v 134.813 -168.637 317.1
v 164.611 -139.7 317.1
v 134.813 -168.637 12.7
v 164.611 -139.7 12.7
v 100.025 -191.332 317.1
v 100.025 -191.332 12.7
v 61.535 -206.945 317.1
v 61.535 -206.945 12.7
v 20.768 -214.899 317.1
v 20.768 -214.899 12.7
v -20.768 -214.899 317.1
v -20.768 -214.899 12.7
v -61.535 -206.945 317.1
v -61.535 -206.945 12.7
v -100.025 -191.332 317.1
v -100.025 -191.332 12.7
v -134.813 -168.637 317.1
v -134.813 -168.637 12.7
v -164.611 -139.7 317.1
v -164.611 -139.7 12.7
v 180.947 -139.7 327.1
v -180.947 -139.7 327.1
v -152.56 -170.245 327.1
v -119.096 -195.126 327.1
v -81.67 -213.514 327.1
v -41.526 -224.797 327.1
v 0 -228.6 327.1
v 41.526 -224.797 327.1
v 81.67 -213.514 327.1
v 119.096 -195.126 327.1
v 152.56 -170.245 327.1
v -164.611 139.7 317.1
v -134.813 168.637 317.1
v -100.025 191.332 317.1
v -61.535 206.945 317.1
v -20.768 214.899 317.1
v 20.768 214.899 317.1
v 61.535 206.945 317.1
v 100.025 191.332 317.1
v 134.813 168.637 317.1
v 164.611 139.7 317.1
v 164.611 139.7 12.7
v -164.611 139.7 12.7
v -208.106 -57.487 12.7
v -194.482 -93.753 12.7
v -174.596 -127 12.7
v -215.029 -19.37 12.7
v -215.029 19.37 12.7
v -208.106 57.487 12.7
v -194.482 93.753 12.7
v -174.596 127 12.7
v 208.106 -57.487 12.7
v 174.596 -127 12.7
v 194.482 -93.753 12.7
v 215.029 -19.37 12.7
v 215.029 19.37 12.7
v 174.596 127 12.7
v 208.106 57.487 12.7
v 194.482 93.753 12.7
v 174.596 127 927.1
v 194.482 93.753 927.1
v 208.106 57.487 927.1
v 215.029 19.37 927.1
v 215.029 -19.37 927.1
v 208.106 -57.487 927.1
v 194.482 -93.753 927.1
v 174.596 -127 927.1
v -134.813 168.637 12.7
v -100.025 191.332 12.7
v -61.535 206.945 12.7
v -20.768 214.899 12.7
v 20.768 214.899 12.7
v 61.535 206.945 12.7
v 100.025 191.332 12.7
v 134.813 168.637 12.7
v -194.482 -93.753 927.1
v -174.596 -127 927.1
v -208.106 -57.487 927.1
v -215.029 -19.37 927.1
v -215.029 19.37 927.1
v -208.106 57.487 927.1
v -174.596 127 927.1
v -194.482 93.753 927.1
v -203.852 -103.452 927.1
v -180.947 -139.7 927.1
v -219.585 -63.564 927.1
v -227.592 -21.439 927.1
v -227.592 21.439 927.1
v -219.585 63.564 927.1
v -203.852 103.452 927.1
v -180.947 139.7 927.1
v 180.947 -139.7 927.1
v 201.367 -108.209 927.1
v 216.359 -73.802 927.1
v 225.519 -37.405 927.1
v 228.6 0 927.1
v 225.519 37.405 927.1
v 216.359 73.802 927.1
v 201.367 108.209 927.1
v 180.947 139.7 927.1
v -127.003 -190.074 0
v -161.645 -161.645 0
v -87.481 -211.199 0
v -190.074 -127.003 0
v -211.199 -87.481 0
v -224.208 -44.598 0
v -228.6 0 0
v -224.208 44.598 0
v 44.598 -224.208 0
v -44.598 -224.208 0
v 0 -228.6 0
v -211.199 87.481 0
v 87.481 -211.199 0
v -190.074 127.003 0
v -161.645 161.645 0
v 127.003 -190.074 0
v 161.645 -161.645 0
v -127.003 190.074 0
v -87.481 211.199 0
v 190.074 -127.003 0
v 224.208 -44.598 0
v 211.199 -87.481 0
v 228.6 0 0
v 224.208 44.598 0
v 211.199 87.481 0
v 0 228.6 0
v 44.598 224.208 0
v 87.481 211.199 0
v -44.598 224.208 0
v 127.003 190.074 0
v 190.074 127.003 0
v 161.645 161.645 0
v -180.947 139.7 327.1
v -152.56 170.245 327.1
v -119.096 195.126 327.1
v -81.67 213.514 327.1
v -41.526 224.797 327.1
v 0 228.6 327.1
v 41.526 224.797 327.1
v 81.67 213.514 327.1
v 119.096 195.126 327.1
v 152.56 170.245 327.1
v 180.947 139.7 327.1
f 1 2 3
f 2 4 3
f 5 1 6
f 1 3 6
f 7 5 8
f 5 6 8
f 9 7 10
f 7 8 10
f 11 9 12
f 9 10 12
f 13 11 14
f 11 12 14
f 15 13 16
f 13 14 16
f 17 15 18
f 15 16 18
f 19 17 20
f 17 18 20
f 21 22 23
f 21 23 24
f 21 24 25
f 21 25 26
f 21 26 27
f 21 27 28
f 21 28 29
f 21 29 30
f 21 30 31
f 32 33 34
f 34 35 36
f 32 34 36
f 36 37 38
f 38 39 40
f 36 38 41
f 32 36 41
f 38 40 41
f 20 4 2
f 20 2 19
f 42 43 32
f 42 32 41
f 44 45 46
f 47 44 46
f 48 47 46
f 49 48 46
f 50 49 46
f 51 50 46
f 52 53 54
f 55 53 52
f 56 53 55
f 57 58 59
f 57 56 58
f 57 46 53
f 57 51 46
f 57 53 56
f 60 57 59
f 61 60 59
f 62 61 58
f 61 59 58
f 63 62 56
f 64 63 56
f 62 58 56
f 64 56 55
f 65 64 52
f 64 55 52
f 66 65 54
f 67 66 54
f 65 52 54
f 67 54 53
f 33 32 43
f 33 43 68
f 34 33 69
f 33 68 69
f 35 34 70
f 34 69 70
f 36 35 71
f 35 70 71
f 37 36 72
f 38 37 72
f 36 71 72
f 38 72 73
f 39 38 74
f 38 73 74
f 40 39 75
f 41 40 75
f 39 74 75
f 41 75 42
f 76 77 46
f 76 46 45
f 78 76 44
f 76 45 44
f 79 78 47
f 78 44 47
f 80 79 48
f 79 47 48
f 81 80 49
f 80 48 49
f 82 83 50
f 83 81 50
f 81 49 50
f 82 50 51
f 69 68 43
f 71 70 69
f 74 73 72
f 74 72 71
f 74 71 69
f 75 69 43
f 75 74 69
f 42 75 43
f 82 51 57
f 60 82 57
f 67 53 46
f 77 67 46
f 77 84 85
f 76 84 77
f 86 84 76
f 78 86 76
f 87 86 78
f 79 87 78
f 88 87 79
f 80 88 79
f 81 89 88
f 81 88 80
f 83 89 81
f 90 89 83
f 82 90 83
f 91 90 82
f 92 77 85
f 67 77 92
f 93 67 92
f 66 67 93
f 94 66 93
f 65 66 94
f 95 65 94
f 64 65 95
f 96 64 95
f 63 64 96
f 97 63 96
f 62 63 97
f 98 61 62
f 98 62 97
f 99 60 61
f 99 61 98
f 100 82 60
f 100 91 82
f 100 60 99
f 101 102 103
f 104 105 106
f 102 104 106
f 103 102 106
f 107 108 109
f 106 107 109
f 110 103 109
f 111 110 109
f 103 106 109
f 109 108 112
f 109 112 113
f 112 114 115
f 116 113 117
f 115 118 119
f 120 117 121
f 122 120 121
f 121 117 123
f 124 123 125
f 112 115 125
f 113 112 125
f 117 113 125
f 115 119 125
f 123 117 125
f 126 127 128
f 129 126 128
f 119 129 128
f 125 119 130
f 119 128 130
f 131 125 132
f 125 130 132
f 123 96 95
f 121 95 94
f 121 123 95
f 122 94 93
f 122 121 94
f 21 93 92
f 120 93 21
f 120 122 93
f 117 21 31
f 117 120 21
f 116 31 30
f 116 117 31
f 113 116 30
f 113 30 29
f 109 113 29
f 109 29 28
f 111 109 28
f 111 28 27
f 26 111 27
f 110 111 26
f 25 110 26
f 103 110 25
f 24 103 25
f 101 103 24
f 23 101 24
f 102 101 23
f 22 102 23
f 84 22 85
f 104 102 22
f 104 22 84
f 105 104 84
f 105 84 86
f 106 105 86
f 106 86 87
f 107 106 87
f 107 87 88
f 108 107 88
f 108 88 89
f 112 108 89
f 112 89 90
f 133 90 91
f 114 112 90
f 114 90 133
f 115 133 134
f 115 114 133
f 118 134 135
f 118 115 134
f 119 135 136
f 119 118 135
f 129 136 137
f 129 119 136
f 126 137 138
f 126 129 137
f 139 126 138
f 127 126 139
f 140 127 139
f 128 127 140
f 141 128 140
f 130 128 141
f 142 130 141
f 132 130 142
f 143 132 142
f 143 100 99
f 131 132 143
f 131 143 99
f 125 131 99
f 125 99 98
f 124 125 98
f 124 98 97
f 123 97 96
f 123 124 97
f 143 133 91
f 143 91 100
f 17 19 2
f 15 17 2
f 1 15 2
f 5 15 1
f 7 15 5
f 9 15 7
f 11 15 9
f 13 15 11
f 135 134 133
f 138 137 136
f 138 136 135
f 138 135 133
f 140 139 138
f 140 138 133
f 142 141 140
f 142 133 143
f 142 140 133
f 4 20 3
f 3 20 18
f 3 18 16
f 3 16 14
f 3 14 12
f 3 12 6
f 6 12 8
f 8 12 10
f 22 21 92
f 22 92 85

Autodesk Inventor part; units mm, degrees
ref_plane "YZ Plane" through (0, 0, 0) normal (1, 0, 0) x (0, 1, 0)
ref_plane "XZ Plane" through (0, 0, 0) normal (0, 1, 0) x (-1, 0, 0)
sketch "Sketch1" plane through (0, 0, 0) normal (0, 0, 1) x (1, 0, 0)
  circle A0 centre (0, 0) radius 228.6
  dimension "d0" = 457.2
extrude "Extrusion1" add sketch "Sketch1" along normal blind 12.7
sketch "Sketch2" plane through (0, 0, 12.7) normal (0, 0, 1) x (1, 0, 0)
  circle A0 centre (0, 0) radius 228.6
  circle A1 centre (0, 0) radius 215.9
  dimension "d3" = 457.2
  dimension "d4" = 431.8
extrude "Extrusion2" add sketch "Sketch2" along normal blind 914.4
sketch "Sketch3" plane through (0, 0, 12.7) normal (0, 0, 1) x (1, 0, 0)
  line L0 (0, -139.7) -> (164.6108, -139.7)
  line L1 (0, -127) -> (174.5961, -127)
  circle A0 centre (0, 0) radius 215.9 projected
  circle A1 centre (0, 0) radius 215.9 projected
  line L2 (0, 127) -> (174.5961, 127)
  line L3 (0, 139.7) -> (164.6108, 139.7)
  line L4 (0, 139.7) -> (-164.6108, 139.7)
  line L5 (0, 127) -> (-174.5961, 127)
  circle A2 centre (0, 0) radius 215.9
  line L6 (0, -127) -> (-174.5961, -127)
  line L7 (0, -139.7) -> (-164.6108, -139.7)
  dimension "d7" = 12.7
  dimension "d8" = 127
  dimension "d9" = 12.7
  dimension "d10" = 127
extrude "Extrusion3" add sketch "Sketch3" along normal blind 914.4 contours L7 A0 L6 L1 L0 | A0 L4 L3 L2 L5
ref_plane "Work Plane3" through (0, 0, 327.1) normal (0, 0, 1) x (1, 0, 0)
sketch "Sketch10" plane through (0, 0, 327.1) normal (0, 0, 1) x (1, 0, 0)
  circle A0 centre (0, 0) radius 228.6 projected
  arc A1 (-164.6108, -139.7) -> (164.6108, -139.7) centre (0, 0) ccw projected
  line L0 (-164.6108, -139.7) -> (-180.9471, -139.7)
  line L1 (164.6108, -139.7) -> (-164.6108, -139.7) projected
  line L2 (164.6108, -139.7) -> (180.9471, -139.7)
  arc A2 (-180.9471, -139.7) -> (180.9471, -139.7) centre (0, 0) ccw
  arc A3 (164.6108, 139.7) -> (-164.6108, 139.7) centre (0, 0) ccw projected
  line L3 (164.6108, 139.7) -> (180.9471, 139.7)
  line L4 (-164.6108, 139.7) -> (164.6108, 139.7) projected
  line L5 (-164.6108, 139.7) -> (-180.9471, 139.7)
  arc A4 (180.9471, 139.7) -> (-180.9471, 139.7) centre (0, 0) ccw
  line L6 (-164.6108, 139.7) -> (164.6108, 139.7)
  line L7 (-164.6108, -139.7) -> (164.6108, -139.7)
extrude "Extrusion7" cut sketch "Sketch10" along normal through all contours L3 A3 L5 A0 | A0 L0 A1 L2 | L4 A3 | A1 L1
sketch "Sketch11" plane through (0, 0, 327.1) normal (0, 0, 1) x (1, 0, 0)
  line L0 (-180.9471, -139.7) -> (180.9471, -139.7)
  arc A0 (-180.9471, -139.7) -> (180.9471, -139.7) centre (0, 0) ccw projected
  arc A1 (-180.9471, -139.7) -> (180.9471, -139.7) centre (0, 0) ccw
  line L1 (-180.9471, 139.7) -> (-164.6108, 139.7) projected
  line L2 (-180.9471, 139.7) -> (180.9471, 139.7)
  line L3 (164.6108, 139.7) -> (180.9471, 139.7) projected
  arc A2 (180.9471, 139.7) -> (-180.9471, 139.7) centre (0, 0) ccw
extrude "Extrusion8" add sketch "Sketch11" against normal blind 10
properties part number "Chassis" material "ABS Plastic"
